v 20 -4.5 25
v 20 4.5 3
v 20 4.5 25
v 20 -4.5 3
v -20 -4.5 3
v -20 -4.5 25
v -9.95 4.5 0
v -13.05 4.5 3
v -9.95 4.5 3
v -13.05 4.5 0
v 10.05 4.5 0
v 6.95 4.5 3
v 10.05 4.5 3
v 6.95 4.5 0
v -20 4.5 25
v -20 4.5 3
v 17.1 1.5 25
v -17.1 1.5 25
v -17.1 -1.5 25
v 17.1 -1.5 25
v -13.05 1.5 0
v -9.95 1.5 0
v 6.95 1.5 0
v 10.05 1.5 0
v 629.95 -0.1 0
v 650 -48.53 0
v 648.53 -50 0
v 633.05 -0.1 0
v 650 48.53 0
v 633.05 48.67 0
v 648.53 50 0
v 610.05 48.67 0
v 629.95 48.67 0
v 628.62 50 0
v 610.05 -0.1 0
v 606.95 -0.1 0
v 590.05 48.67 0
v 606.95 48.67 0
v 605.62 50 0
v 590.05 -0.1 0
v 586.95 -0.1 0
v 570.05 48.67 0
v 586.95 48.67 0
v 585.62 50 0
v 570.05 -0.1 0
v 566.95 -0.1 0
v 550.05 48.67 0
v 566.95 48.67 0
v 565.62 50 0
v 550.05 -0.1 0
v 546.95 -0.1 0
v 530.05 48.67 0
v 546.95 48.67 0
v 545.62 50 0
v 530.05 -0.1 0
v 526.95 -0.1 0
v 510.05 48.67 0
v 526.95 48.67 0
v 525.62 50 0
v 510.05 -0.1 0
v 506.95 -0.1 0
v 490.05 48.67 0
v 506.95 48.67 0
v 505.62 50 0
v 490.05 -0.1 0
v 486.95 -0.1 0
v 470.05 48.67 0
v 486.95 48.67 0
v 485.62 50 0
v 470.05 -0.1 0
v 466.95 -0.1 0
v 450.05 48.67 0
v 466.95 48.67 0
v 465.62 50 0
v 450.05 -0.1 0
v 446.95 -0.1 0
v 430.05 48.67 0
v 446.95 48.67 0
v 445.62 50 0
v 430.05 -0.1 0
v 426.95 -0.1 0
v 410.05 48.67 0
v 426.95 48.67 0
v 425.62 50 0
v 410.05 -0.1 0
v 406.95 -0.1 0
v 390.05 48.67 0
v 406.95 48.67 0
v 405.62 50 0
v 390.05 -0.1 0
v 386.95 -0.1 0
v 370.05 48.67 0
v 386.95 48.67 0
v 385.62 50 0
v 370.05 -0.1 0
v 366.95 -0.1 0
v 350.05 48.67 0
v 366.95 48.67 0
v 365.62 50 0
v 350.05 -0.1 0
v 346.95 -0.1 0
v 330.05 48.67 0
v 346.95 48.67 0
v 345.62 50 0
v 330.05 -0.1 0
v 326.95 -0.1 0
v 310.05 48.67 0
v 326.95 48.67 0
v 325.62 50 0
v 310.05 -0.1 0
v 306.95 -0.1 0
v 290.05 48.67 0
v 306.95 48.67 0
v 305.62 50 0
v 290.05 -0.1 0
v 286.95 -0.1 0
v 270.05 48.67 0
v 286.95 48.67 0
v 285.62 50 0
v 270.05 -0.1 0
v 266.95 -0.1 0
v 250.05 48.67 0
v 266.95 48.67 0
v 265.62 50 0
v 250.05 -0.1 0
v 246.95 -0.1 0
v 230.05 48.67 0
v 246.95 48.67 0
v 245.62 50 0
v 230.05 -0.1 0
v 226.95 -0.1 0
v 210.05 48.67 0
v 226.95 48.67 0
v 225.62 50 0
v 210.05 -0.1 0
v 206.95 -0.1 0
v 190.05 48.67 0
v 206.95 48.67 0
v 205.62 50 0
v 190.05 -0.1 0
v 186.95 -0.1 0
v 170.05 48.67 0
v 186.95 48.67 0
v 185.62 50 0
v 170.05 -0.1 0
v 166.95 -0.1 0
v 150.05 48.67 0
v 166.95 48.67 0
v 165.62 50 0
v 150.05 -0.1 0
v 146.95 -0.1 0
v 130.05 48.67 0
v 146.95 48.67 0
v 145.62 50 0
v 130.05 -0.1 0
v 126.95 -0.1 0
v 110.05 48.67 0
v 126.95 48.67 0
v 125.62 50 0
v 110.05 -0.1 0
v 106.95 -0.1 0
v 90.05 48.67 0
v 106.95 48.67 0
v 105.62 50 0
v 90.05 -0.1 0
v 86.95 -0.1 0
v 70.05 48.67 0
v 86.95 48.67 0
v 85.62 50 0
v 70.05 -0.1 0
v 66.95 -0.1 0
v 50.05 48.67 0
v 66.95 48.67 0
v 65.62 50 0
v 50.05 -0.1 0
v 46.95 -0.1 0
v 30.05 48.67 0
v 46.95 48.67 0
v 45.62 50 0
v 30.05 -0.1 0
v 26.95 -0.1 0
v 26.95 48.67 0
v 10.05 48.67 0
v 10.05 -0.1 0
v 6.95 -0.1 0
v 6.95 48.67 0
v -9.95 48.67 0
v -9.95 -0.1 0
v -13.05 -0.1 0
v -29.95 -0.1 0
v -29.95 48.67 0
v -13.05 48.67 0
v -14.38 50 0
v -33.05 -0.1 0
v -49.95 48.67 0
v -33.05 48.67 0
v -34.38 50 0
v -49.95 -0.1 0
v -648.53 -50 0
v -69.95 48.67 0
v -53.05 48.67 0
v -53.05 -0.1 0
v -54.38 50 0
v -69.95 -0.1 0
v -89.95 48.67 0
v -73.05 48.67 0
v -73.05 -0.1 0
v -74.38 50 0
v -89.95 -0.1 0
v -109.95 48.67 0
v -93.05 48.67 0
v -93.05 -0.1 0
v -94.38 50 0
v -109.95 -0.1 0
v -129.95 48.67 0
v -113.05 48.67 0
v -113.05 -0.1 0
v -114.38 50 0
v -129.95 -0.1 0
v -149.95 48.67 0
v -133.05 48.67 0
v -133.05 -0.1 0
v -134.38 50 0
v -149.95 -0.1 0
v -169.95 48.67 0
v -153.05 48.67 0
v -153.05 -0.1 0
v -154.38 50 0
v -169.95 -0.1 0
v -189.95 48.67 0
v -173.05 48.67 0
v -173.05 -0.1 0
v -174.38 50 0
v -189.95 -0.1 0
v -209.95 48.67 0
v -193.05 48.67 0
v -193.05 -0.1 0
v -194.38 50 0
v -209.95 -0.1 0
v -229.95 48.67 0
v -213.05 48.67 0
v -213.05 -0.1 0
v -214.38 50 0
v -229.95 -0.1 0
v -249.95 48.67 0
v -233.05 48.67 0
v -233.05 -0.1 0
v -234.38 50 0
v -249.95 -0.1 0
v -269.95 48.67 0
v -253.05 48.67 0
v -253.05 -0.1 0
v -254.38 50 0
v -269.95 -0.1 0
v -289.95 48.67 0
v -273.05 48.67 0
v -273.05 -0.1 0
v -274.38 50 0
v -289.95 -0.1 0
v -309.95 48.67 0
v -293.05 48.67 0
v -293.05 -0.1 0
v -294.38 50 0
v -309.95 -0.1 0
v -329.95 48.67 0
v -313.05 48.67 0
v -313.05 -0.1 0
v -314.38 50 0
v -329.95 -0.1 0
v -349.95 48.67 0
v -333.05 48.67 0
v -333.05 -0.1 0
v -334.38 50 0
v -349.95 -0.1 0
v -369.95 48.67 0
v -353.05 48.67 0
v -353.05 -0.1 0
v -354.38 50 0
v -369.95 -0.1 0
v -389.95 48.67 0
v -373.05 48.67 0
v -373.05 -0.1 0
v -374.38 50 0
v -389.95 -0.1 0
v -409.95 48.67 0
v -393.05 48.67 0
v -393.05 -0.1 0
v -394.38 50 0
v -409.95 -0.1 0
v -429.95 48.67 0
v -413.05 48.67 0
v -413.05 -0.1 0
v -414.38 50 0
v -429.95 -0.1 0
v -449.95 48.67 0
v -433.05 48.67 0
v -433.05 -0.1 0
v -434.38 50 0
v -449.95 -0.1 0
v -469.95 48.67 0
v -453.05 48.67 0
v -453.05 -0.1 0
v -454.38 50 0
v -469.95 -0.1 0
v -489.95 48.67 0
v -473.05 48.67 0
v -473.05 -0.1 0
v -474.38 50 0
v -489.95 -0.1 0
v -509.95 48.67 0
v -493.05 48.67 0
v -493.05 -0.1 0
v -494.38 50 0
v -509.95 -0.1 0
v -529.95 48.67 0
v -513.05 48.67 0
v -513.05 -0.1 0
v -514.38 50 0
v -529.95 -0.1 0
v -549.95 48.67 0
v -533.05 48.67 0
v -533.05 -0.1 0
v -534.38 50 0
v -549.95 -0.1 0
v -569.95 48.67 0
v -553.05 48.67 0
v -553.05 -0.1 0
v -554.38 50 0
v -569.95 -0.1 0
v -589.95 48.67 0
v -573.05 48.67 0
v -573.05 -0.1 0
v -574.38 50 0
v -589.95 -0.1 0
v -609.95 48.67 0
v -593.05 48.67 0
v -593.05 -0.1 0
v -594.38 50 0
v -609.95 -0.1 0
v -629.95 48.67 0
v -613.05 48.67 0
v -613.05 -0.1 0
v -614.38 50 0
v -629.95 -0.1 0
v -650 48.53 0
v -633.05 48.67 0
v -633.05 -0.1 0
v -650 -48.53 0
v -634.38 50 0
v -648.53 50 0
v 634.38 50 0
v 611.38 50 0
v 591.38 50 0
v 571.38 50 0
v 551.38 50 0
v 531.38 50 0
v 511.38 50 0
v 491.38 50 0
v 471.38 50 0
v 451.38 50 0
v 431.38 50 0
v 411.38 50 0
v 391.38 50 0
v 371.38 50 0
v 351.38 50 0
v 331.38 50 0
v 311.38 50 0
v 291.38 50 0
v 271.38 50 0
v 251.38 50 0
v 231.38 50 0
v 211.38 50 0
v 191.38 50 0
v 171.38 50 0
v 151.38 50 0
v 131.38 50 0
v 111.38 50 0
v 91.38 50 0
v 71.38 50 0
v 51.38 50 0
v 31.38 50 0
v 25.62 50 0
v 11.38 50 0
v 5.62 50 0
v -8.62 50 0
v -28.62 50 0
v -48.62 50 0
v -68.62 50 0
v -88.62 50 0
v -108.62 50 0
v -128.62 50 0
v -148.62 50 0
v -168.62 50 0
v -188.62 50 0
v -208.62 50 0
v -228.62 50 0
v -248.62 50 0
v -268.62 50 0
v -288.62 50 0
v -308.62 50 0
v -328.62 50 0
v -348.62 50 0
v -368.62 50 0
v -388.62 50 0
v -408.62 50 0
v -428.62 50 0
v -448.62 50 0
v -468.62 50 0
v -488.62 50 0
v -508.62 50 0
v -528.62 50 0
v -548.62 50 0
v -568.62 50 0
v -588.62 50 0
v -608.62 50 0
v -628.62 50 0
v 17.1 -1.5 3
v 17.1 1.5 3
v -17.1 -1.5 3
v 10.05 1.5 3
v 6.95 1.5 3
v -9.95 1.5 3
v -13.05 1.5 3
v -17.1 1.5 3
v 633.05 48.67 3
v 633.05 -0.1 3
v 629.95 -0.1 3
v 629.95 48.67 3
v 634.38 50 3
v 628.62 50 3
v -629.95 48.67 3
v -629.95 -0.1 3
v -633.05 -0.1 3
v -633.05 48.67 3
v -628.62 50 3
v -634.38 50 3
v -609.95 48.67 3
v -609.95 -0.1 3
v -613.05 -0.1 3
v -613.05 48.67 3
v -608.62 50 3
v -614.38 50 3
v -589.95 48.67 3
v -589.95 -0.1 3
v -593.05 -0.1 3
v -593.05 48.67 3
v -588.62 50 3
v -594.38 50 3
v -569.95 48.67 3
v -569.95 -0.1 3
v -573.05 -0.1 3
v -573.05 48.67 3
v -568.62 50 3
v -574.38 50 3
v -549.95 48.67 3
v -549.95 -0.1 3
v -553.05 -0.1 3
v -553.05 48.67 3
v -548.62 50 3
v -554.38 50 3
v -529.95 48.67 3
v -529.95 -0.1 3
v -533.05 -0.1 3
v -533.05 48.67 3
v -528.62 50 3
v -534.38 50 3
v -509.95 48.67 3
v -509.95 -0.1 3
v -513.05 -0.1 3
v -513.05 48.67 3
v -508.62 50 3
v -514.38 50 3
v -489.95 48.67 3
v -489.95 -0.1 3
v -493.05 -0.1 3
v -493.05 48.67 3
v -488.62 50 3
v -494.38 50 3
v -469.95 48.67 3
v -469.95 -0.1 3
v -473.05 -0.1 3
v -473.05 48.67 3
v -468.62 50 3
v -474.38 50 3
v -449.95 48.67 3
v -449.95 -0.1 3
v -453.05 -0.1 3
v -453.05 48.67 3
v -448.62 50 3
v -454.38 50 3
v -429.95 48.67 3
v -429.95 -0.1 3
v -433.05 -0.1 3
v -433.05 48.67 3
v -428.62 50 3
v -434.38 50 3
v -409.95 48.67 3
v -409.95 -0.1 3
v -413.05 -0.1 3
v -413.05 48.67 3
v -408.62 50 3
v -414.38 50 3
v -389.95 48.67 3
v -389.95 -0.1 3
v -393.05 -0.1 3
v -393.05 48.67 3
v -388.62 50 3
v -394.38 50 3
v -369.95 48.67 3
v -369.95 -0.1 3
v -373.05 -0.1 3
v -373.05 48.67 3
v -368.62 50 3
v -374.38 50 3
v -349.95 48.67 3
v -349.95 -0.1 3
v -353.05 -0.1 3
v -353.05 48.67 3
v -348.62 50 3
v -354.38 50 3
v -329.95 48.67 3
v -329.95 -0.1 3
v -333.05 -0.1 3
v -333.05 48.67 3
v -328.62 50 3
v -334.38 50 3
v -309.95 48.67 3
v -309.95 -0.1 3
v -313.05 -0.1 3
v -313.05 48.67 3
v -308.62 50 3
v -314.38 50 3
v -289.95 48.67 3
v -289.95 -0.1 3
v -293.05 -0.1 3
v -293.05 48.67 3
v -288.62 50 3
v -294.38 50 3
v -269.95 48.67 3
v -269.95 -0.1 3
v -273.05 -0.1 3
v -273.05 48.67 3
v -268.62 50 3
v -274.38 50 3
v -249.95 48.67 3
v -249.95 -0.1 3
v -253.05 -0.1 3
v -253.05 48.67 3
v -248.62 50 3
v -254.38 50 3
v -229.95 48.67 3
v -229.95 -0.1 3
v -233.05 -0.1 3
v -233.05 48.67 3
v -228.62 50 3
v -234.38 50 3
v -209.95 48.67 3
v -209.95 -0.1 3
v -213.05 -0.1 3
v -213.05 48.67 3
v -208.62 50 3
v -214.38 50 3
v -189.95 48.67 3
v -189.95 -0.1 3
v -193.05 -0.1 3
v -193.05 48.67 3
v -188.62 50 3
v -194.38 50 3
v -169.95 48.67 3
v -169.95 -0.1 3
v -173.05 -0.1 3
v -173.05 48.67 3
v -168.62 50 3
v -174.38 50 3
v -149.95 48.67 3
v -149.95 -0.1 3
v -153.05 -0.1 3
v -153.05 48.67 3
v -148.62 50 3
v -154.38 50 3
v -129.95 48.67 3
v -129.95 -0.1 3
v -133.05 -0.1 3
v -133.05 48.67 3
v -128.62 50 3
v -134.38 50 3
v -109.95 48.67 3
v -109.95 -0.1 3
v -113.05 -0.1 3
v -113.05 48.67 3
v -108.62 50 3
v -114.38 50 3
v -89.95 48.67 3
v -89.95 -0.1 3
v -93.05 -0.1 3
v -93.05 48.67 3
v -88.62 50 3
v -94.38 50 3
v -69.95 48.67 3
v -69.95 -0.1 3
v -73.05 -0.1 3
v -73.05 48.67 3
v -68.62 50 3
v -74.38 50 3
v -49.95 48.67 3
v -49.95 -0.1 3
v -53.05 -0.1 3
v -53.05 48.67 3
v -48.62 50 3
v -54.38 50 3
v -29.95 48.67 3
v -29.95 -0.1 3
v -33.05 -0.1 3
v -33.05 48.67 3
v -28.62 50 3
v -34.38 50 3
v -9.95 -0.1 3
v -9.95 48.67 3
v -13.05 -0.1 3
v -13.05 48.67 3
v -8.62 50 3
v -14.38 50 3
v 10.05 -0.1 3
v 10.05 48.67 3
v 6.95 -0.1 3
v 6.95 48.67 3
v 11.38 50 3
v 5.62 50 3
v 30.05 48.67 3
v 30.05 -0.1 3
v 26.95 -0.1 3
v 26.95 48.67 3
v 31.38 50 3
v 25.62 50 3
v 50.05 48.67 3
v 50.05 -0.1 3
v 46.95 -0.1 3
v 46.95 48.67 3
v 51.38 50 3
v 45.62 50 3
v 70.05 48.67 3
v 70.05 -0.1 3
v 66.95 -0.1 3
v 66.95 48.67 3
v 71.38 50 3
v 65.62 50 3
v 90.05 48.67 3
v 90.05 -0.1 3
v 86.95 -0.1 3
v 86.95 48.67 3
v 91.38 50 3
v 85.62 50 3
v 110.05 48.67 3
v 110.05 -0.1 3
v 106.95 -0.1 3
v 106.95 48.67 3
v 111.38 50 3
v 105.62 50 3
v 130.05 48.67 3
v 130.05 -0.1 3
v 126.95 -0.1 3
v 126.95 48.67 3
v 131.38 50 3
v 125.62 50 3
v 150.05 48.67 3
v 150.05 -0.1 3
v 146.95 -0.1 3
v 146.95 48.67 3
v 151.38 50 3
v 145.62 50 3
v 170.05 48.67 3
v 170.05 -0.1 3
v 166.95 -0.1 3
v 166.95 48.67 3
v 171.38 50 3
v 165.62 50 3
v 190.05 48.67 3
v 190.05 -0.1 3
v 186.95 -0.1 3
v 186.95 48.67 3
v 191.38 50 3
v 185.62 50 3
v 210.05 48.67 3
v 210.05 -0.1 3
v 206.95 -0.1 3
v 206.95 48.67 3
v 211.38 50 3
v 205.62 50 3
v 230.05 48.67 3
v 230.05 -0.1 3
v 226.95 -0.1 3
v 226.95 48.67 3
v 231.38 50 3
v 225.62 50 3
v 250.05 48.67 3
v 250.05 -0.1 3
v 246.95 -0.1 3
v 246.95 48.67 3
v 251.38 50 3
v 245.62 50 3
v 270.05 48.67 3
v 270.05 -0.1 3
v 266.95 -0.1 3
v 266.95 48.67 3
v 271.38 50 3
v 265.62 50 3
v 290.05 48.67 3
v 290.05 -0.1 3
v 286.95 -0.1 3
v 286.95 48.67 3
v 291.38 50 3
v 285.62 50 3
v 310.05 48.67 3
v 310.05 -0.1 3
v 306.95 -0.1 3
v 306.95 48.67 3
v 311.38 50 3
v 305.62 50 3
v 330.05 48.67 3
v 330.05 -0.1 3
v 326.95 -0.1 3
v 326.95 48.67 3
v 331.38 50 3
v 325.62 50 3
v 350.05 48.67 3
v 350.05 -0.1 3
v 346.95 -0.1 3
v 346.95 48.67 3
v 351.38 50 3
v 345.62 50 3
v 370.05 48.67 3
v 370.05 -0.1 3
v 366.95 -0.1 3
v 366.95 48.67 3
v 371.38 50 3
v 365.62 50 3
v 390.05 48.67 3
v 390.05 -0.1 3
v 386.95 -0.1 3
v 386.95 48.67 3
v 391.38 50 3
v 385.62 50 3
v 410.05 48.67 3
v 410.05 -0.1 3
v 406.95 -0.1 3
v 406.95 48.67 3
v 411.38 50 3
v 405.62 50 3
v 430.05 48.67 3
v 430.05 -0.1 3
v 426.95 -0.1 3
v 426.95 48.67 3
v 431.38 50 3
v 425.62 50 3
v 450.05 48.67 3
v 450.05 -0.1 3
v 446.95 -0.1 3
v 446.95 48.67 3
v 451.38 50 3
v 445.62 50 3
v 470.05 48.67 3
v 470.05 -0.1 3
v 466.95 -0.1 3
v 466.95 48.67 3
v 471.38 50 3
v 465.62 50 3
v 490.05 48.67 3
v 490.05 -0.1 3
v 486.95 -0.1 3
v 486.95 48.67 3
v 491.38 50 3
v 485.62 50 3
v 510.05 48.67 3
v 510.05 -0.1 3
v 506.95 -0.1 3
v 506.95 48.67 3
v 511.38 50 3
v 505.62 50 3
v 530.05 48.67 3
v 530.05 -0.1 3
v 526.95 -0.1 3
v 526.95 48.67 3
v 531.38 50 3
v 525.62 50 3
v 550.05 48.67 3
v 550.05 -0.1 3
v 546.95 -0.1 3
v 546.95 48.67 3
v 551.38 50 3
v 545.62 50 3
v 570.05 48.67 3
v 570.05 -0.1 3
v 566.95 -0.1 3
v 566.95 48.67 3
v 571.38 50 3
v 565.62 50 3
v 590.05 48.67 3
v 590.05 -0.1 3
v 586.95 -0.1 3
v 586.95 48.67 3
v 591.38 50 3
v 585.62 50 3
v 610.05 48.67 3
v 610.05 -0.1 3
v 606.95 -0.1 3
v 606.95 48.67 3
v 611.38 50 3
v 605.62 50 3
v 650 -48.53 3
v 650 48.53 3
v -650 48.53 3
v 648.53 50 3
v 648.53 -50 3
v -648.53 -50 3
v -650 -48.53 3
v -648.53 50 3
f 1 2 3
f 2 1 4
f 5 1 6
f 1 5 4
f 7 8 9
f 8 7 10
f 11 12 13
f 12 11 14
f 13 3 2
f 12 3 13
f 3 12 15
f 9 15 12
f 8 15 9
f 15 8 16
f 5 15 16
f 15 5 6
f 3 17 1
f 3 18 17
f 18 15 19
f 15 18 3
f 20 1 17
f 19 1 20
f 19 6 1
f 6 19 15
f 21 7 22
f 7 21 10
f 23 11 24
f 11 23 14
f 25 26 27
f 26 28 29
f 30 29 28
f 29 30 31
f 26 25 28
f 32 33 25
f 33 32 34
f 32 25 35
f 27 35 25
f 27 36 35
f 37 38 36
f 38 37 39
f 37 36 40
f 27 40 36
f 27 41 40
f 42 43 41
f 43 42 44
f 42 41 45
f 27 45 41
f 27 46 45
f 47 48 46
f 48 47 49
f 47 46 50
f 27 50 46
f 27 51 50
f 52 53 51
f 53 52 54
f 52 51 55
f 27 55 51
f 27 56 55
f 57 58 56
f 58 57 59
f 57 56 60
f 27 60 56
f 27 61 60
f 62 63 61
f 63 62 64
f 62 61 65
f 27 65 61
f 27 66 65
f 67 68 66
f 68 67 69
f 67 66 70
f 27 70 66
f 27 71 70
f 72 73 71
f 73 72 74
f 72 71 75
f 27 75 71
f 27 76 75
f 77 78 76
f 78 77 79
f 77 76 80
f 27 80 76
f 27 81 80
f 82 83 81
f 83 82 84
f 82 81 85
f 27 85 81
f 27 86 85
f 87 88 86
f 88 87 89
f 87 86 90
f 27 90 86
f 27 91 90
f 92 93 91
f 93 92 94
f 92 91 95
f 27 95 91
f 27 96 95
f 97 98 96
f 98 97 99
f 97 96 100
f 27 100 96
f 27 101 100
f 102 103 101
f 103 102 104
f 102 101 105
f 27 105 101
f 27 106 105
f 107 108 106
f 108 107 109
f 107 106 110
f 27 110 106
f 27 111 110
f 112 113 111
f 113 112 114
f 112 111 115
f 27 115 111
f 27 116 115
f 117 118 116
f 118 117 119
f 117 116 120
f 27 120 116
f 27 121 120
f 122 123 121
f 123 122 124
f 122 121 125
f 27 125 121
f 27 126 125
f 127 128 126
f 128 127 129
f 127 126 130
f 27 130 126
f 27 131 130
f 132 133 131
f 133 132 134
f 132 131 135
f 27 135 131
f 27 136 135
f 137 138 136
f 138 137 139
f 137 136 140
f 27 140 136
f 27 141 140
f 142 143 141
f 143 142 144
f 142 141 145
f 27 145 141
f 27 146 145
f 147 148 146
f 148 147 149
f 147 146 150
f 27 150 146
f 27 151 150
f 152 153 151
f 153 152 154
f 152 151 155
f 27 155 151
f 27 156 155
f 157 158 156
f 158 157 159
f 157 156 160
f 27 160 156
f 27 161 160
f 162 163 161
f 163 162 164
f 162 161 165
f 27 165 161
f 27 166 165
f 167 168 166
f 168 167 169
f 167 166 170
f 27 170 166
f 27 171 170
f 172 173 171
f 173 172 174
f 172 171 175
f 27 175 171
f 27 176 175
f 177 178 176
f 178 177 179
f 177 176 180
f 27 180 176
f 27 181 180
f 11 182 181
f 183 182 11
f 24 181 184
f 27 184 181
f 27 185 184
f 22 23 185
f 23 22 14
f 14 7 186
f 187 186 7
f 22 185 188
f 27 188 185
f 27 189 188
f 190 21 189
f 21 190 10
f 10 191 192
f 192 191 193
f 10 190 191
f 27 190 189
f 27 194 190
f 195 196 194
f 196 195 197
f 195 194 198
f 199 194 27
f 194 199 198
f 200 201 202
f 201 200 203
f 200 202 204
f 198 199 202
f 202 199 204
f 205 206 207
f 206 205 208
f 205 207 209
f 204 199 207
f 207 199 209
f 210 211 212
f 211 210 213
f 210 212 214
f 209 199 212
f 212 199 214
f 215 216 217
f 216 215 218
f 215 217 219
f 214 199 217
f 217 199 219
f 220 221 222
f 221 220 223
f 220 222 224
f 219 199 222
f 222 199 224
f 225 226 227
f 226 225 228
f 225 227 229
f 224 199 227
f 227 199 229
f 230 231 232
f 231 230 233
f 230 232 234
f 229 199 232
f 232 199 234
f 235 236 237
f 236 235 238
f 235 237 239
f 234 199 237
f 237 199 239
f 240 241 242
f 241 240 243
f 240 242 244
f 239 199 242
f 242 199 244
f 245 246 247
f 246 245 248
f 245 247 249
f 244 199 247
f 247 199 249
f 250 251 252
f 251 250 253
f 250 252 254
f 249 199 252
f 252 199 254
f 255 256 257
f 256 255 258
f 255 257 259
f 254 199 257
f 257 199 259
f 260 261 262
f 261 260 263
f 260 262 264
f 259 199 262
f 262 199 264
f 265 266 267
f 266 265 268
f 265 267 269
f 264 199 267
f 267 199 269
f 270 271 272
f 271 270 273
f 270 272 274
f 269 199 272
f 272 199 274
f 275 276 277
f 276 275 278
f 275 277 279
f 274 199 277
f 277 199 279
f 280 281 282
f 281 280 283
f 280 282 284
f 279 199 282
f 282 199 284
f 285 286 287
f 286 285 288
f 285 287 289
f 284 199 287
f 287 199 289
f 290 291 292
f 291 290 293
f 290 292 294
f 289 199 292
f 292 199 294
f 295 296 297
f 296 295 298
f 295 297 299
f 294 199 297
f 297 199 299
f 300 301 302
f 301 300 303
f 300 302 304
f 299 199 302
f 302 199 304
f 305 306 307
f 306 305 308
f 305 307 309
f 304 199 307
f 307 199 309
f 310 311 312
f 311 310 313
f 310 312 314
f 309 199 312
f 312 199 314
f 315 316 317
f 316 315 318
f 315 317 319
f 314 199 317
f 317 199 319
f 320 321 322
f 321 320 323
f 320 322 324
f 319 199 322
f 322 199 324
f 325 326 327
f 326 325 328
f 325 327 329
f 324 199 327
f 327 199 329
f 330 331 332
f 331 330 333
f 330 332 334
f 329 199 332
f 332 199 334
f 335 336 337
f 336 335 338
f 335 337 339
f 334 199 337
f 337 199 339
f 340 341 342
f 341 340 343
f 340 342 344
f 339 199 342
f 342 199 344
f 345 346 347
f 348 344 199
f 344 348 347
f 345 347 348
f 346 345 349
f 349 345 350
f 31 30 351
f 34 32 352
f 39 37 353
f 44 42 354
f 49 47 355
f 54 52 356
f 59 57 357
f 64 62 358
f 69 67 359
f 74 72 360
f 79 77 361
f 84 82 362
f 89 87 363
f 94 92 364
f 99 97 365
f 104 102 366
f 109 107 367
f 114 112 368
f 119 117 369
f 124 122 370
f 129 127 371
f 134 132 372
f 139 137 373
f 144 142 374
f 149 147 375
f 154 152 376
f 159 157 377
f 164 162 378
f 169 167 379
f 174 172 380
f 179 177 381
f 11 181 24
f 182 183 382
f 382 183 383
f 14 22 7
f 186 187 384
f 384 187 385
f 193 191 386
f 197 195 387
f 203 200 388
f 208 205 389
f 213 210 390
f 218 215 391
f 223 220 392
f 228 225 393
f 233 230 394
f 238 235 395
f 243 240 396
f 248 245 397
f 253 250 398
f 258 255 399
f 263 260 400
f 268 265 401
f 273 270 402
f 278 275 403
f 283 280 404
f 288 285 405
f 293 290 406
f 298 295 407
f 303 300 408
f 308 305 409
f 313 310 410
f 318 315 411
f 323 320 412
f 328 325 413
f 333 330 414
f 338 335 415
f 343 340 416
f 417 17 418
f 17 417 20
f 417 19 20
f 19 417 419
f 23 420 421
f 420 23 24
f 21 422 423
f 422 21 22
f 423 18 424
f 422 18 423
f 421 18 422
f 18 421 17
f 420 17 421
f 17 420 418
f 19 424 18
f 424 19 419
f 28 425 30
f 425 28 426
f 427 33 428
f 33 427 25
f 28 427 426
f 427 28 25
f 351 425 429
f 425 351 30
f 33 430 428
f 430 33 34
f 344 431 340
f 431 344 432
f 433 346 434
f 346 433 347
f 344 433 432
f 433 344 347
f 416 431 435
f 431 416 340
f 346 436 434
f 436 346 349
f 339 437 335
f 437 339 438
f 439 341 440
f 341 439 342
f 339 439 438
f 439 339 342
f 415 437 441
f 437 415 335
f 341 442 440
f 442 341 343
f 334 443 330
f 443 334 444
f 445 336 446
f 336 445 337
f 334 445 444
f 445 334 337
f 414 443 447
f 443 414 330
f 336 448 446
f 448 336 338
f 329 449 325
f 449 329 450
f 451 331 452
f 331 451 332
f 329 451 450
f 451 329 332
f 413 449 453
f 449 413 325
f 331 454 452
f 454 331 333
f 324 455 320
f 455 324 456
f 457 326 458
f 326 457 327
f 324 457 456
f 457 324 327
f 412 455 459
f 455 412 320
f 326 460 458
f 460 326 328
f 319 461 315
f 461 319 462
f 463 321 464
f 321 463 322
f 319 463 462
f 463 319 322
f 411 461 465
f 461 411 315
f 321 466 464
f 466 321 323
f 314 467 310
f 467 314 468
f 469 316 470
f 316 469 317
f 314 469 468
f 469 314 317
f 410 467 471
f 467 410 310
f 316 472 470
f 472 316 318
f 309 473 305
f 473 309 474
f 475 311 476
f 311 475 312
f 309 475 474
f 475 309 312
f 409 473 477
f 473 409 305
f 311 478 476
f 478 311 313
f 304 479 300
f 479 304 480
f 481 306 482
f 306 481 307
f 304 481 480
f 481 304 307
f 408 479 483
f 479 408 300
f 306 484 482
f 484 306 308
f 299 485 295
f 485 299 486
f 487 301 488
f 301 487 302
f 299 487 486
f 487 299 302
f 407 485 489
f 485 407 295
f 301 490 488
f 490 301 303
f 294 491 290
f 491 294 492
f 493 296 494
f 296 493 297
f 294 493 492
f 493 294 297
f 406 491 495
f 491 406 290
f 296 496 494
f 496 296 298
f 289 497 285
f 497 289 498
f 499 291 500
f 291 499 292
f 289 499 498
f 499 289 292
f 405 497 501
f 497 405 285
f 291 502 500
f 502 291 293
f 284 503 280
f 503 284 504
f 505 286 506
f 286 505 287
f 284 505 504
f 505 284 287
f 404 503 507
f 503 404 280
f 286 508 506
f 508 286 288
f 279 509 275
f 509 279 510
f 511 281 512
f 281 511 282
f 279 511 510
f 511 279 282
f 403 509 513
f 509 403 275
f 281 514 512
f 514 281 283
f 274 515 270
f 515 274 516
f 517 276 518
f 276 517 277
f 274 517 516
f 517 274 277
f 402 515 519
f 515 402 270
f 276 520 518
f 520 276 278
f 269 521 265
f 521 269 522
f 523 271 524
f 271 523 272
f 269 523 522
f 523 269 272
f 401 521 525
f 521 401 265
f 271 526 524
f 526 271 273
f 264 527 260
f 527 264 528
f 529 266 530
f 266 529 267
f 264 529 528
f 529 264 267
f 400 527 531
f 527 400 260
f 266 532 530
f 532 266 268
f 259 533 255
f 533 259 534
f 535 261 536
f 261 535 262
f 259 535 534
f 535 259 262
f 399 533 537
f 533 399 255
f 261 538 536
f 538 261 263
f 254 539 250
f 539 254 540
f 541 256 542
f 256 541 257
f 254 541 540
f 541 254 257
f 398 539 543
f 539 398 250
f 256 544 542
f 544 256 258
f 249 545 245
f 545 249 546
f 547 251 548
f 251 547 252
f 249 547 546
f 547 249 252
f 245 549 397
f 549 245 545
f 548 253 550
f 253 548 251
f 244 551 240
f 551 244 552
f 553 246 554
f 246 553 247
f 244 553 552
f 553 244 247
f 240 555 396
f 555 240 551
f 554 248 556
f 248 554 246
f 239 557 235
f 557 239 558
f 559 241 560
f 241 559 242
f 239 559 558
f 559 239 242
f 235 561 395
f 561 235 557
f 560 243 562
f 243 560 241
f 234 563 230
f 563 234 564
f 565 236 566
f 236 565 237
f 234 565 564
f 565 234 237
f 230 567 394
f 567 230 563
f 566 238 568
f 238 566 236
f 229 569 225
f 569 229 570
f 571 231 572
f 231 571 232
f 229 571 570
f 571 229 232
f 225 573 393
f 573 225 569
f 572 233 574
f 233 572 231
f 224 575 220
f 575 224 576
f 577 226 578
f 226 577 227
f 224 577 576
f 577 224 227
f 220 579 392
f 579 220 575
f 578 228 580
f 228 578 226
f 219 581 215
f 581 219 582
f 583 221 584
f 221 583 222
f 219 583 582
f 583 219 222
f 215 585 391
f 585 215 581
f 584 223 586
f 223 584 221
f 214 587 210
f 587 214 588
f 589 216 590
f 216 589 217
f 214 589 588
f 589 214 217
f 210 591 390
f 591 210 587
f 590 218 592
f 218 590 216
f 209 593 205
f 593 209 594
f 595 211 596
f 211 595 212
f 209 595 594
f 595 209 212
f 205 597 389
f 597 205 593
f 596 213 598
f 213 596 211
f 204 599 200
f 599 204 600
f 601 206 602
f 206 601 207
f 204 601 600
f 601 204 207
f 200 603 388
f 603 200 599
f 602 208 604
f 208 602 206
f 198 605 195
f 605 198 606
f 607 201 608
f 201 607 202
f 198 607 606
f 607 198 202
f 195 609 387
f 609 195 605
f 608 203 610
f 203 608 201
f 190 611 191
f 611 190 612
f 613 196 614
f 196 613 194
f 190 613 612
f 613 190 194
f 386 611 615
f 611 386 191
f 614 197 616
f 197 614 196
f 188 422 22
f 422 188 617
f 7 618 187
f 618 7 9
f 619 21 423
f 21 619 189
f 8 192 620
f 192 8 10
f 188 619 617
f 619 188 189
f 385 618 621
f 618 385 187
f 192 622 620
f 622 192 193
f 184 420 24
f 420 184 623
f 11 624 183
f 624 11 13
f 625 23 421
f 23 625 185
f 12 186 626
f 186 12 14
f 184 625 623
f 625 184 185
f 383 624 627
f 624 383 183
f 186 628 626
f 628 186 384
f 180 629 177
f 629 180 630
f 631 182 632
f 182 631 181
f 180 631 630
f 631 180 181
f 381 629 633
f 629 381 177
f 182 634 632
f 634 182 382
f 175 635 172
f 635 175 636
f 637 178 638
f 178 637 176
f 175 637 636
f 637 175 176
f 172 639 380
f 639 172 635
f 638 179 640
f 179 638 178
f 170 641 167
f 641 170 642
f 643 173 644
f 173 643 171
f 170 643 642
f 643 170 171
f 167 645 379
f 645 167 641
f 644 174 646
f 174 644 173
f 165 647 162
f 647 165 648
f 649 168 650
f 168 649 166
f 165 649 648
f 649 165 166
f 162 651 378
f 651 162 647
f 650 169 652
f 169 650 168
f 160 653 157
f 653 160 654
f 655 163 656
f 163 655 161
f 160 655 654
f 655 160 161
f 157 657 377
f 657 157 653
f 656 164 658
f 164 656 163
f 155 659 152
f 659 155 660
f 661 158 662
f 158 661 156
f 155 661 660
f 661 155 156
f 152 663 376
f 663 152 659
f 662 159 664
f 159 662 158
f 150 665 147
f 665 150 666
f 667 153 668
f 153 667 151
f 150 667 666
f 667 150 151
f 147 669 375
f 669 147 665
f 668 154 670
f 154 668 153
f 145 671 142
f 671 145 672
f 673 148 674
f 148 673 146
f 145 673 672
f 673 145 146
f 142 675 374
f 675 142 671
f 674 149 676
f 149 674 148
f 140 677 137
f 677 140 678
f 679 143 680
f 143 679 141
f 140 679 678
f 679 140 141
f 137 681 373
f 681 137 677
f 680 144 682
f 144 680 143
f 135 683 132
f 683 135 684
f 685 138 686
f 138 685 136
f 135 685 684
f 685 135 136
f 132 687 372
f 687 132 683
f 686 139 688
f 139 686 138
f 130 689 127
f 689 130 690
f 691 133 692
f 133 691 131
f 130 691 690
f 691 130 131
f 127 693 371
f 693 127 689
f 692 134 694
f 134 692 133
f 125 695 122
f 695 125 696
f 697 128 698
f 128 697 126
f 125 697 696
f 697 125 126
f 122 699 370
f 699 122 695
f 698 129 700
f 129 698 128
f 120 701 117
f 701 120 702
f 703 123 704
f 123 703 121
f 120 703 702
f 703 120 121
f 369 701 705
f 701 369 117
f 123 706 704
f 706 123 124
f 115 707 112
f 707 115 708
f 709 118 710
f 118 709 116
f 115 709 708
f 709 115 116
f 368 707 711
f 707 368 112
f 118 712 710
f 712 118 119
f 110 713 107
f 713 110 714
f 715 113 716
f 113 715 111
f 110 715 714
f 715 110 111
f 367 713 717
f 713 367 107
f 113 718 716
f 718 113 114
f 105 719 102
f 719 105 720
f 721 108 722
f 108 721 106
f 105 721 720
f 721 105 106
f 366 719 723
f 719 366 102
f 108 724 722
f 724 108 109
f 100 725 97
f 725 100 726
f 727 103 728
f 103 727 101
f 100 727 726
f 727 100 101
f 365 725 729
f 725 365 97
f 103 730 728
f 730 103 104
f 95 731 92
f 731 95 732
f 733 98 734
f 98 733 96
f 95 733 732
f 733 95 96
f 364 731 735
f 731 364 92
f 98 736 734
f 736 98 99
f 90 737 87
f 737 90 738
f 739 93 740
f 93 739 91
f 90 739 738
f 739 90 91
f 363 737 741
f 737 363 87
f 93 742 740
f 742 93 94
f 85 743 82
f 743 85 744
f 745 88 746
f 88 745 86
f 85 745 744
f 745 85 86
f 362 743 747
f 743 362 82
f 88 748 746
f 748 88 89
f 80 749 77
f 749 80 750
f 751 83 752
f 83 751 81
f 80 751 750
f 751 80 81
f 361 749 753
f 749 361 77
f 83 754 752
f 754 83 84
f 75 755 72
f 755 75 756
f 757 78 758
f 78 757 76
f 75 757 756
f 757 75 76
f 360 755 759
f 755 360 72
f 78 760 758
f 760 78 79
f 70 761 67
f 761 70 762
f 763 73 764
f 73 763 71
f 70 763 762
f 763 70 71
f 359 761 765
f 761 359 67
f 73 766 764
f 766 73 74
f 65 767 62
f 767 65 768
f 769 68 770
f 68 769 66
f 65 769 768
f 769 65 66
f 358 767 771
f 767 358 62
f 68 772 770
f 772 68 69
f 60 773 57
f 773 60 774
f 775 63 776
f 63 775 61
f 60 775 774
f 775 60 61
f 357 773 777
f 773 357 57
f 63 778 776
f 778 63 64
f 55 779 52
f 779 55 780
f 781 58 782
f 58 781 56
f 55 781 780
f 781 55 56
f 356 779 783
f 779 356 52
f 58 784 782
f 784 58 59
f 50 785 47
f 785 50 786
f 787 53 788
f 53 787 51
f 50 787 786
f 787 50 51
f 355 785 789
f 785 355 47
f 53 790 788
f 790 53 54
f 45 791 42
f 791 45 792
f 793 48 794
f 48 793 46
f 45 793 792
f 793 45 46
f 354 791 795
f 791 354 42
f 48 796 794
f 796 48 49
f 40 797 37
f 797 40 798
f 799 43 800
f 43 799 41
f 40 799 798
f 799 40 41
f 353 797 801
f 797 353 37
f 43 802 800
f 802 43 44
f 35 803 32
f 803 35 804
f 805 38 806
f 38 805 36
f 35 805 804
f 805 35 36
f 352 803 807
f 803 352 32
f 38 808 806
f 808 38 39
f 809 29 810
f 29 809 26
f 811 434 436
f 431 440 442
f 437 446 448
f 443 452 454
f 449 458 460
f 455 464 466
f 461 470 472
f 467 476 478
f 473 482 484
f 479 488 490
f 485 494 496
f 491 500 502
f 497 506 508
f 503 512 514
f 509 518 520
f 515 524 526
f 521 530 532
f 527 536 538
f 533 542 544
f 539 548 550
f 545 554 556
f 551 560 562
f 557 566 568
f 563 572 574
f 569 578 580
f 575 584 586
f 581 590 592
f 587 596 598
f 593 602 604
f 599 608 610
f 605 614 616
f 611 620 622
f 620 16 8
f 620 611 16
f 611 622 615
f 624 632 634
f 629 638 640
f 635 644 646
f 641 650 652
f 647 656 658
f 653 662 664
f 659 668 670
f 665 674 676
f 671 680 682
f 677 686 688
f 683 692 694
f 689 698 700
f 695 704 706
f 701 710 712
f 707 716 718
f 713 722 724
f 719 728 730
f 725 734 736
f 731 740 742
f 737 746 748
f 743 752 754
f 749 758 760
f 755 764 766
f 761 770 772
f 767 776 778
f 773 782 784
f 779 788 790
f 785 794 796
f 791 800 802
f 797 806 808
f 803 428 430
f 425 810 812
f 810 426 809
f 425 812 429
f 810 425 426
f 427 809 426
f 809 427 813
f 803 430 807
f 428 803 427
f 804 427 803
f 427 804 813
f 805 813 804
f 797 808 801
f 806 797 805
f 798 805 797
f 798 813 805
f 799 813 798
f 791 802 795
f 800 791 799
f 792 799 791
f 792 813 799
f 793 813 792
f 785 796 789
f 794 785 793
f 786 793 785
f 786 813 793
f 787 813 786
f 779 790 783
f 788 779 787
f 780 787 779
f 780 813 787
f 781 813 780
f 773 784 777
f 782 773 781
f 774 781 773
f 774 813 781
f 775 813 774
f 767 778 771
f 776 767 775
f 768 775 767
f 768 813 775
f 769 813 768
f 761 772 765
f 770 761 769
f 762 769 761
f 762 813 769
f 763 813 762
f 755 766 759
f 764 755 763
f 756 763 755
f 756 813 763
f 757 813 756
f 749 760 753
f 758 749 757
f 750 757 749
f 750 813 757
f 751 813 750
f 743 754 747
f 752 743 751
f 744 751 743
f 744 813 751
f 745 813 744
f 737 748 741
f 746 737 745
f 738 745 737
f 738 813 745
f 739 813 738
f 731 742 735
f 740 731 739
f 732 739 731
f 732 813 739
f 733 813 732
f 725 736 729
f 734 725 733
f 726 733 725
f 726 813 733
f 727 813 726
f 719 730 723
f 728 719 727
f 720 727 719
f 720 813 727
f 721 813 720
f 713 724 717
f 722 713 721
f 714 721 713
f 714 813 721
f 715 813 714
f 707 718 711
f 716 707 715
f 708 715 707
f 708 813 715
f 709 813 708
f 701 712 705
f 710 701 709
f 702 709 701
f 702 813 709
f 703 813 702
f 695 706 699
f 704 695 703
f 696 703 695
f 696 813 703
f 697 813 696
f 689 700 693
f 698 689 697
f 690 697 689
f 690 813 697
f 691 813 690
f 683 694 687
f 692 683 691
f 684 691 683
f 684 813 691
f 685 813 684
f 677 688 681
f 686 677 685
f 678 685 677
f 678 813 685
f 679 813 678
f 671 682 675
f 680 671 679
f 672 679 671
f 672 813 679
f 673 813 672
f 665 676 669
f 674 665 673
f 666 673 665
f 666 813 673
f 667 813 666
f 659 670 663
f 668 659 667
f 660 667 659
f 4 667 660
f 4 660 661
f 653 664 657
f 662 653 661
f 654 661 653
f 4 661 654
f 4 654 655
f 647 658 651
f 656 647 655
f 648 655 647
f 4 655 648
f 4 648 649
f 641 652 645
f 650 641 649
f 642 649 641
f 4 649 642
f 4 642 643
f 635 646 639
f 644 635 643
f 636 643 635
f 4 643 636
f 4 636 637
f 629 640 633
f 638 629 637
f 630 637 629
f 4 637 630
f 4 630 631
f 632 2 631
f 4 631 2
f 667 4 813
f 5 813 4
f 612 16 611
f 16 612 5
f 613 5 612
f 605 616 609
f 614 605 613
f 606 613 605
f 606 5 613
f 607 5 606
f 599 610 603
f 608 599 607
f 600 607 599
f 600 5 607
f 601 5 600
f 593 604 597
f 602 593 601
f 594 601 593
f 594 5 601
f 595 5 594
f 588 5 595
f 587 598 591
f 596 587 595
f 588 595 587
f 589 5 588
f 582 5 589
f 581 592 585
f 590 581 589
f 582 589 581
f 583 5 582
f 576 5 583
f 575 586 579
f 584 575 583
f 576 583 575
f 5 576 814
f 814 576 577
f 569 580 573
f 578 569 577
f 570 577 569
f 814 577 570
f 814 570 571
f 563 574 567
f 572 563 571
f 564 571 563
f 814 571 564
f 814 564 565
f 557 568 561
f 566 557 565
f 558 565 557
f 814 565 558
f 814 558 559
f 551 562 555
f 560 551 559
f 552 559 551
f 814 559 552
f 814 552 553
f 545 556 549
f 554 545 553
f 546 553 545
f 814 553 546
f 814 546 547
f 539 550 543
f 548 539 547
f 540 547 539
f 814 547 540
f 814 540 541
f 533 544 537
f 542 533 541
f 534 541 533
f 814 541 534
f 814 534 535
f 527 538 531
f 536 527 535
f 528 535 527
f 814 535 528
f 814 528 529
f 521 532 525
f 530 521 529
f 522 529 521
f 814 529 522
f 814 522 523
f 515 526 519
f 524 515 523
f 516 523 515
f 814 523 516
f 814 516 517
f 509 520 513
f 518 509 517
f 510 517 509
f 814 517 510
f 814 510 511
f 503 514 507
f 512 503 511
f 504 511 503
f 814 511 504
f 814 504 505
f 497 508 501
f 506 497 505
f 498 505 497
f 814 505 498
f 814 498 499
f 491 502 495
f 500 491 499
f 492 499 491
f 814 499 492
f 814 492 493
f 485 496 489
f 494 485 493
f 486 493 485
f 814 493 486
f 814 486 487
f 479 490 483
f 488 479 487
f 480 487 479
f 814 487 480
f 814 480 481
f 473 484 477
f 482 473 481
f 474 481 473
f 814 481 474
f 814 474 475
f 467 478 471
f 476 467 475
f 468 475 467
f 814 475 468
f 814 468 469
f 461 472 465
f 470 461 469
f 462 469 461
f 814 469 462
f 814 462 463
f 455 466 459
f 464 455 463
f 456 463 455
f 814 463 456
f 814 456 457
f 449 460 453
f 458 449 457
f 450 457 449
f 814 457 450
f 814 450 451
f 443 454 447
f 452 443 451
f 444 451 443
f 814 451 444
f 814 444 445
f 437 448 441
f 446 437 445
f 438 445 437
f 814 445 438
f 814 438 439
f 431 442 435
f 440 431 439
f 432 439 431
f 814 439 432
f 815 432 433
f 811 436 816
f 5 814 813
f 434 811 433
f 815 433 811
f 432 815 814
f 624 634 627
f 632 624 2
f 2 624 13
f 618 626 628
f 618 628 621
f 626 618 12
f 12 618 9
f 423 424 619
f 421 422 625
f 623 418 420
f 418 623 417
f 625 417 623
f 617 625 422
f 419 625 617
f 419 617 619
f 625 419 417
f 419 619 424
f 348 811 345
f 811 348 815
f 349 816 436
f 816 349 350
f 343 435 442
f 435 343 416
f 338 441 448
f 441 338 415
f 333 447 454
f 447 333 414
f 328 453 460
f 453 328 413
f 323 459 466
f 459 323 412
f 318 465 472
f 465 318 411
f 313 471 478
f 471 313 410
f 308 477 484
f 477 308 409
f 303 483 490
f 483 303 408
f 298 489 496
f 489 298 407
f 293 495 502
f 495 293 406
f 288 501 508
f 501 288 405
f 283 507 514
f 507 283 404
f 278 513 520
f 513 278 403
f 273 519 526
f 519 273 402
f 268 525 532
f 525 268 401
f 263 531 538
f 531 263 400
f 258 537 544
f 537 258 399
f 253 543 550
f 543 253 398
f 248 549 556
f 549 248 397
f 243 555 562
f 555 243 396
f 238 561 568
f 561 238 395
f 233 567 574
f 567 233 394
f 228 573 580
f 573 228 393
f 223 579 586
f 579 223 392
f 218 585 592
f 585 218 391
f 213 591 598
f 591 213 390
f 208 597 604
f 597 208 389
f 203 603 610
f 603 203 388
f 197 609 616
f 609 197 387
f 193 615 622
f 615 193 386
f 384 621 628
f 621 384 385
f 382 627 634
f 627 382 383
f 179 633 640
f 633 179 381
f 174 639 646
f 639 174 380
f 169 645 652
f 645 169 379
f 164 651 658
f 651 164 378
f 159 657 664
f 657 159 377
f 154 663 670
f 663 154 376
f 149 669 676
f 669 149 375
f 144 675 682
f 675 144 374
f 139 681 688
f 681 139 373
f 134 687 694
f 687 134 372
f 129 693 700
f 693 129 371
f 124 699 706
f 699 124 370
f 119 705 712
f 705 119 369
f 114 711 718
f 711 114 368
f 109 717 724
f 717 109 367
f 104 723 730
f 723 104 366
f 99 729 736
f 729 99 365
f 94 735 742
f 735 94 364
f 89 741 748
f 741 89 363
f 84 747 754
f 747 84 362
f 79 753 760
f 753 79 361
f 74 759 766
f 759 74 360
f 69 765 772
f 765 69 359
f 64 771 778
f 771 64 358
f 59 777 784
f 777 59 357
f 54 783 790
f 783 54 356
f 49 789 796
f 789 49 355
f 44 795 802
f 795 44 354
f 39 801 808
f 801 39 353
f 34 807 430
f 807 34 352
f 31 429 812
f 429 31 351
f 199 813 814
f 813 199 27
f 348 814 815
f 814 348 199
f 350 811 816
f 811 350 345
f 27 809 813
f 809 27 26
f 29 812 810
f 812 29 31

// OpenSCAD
/* [Overall] */

// show divider
show_divider="yes"; //[yes,no]
length=1300;
height=100;
wall=3;
gap_spacing=20.0; //[1:.1:50]
chamfer=wall/2;

// show_clip
show_clip="yes"; //[yes,no]

/* [Other Options] */
$fn=4;
safety=.01;
gap_w=wall+.1;
// .3 here so the gap goes just a little past center to keep crossed pieces
// from rocking
gap_h=(height/2)+.3;

//----------------------------------------------------------------------------
module divider_base(h=50,l=130) {
cube([l,h,wall],center=true);
}

//----------------------------------------------------------------------------
module cut_gaps(spacing=20) {
difference() {
children();
union() {
gaps();
}
}
}

//----------------------------------------------------------------------------
module gaps() {

translate([(length/2)-gap_spacing+wall/2,gap_h/2-.1,0])
gap();

for(i=[-length/2+gap_spacing-(wall/2):gap_spacing:length/2-gap_spacing*2]) {
translate([i,gap_h/2-.1,0])
gap();
}
}

//----------------------------------------------------------------------------
module gap() {

union() {
cube([gap_w,gap_h,gap_w],center=true);

mirror([1,0,0])
translate([0,gap_h/2-gap_w/2,0])
translate([-gap_w+safety,0,0])
small_triangle(size=gap_w/2,thickness=gap_w);

translate([0,gap_h/2-gap_w/2,0])
translate([-gap_w+safety,0,0])
small_triangle(size=gap_w/2,thickness=gap_w);
}
}

//----------------------------------------------------------------------------
module cut_corners(chamfer=1) {
c=chamfer;
difference() {
children();
union() {
mirror([0,1,0])
mirror([1,0,0])
translate([length/2-c+safety,height/2-c+safety,0])
small_triangle(size=c,thickness=wall*2);

mirror([1,0,0])
translate([length/2-c+safety,height/2-c+safety,0])
small_triangle(size=c,thickness=wall*2);

mirror([0,1,0])
translate([length/2-c+safety,height/2-c+safety,0])
small_triangle(size=c,thickness=wall*2);

translate([length/2-c+safety,height/2-c+safety,0])
small_triangle(size=c,thickness=wall*2);
}
}
}

//----------------------------------------------------------------------------
module small_triangle(size=5,thickness=3) {
c=size;
linear_extrude(height=thickness+safety,center=true)
polygon([[c+safety,0],[c+safety,c+safety],[0,c+safety],[c+safety,0]]);
}
//----------------------------------------------------------------------------
module clip(gap_spacing=15,height=100) {
comb_w=gap_spacing-wall;
translate([0,0,height/8])
rotate([90,0,0])
difference() {
cube([comb_w*2+wall*2,height/4,wall*3],center=true);
//.2 here so the fit is not too tight
cube([comb_w*2+.2,height,wall],center=true);
}
}

if(show_clip=="yes") {
  clip(height=height,gap_spacing=gap_spacing);
  }
if(show_divider=="yes") {
  translate([0,0,wall/2])
  cut_corners(chamfer=chamfer)
  cut_gaps()
  divider_base(h=height,l=length);
  }
